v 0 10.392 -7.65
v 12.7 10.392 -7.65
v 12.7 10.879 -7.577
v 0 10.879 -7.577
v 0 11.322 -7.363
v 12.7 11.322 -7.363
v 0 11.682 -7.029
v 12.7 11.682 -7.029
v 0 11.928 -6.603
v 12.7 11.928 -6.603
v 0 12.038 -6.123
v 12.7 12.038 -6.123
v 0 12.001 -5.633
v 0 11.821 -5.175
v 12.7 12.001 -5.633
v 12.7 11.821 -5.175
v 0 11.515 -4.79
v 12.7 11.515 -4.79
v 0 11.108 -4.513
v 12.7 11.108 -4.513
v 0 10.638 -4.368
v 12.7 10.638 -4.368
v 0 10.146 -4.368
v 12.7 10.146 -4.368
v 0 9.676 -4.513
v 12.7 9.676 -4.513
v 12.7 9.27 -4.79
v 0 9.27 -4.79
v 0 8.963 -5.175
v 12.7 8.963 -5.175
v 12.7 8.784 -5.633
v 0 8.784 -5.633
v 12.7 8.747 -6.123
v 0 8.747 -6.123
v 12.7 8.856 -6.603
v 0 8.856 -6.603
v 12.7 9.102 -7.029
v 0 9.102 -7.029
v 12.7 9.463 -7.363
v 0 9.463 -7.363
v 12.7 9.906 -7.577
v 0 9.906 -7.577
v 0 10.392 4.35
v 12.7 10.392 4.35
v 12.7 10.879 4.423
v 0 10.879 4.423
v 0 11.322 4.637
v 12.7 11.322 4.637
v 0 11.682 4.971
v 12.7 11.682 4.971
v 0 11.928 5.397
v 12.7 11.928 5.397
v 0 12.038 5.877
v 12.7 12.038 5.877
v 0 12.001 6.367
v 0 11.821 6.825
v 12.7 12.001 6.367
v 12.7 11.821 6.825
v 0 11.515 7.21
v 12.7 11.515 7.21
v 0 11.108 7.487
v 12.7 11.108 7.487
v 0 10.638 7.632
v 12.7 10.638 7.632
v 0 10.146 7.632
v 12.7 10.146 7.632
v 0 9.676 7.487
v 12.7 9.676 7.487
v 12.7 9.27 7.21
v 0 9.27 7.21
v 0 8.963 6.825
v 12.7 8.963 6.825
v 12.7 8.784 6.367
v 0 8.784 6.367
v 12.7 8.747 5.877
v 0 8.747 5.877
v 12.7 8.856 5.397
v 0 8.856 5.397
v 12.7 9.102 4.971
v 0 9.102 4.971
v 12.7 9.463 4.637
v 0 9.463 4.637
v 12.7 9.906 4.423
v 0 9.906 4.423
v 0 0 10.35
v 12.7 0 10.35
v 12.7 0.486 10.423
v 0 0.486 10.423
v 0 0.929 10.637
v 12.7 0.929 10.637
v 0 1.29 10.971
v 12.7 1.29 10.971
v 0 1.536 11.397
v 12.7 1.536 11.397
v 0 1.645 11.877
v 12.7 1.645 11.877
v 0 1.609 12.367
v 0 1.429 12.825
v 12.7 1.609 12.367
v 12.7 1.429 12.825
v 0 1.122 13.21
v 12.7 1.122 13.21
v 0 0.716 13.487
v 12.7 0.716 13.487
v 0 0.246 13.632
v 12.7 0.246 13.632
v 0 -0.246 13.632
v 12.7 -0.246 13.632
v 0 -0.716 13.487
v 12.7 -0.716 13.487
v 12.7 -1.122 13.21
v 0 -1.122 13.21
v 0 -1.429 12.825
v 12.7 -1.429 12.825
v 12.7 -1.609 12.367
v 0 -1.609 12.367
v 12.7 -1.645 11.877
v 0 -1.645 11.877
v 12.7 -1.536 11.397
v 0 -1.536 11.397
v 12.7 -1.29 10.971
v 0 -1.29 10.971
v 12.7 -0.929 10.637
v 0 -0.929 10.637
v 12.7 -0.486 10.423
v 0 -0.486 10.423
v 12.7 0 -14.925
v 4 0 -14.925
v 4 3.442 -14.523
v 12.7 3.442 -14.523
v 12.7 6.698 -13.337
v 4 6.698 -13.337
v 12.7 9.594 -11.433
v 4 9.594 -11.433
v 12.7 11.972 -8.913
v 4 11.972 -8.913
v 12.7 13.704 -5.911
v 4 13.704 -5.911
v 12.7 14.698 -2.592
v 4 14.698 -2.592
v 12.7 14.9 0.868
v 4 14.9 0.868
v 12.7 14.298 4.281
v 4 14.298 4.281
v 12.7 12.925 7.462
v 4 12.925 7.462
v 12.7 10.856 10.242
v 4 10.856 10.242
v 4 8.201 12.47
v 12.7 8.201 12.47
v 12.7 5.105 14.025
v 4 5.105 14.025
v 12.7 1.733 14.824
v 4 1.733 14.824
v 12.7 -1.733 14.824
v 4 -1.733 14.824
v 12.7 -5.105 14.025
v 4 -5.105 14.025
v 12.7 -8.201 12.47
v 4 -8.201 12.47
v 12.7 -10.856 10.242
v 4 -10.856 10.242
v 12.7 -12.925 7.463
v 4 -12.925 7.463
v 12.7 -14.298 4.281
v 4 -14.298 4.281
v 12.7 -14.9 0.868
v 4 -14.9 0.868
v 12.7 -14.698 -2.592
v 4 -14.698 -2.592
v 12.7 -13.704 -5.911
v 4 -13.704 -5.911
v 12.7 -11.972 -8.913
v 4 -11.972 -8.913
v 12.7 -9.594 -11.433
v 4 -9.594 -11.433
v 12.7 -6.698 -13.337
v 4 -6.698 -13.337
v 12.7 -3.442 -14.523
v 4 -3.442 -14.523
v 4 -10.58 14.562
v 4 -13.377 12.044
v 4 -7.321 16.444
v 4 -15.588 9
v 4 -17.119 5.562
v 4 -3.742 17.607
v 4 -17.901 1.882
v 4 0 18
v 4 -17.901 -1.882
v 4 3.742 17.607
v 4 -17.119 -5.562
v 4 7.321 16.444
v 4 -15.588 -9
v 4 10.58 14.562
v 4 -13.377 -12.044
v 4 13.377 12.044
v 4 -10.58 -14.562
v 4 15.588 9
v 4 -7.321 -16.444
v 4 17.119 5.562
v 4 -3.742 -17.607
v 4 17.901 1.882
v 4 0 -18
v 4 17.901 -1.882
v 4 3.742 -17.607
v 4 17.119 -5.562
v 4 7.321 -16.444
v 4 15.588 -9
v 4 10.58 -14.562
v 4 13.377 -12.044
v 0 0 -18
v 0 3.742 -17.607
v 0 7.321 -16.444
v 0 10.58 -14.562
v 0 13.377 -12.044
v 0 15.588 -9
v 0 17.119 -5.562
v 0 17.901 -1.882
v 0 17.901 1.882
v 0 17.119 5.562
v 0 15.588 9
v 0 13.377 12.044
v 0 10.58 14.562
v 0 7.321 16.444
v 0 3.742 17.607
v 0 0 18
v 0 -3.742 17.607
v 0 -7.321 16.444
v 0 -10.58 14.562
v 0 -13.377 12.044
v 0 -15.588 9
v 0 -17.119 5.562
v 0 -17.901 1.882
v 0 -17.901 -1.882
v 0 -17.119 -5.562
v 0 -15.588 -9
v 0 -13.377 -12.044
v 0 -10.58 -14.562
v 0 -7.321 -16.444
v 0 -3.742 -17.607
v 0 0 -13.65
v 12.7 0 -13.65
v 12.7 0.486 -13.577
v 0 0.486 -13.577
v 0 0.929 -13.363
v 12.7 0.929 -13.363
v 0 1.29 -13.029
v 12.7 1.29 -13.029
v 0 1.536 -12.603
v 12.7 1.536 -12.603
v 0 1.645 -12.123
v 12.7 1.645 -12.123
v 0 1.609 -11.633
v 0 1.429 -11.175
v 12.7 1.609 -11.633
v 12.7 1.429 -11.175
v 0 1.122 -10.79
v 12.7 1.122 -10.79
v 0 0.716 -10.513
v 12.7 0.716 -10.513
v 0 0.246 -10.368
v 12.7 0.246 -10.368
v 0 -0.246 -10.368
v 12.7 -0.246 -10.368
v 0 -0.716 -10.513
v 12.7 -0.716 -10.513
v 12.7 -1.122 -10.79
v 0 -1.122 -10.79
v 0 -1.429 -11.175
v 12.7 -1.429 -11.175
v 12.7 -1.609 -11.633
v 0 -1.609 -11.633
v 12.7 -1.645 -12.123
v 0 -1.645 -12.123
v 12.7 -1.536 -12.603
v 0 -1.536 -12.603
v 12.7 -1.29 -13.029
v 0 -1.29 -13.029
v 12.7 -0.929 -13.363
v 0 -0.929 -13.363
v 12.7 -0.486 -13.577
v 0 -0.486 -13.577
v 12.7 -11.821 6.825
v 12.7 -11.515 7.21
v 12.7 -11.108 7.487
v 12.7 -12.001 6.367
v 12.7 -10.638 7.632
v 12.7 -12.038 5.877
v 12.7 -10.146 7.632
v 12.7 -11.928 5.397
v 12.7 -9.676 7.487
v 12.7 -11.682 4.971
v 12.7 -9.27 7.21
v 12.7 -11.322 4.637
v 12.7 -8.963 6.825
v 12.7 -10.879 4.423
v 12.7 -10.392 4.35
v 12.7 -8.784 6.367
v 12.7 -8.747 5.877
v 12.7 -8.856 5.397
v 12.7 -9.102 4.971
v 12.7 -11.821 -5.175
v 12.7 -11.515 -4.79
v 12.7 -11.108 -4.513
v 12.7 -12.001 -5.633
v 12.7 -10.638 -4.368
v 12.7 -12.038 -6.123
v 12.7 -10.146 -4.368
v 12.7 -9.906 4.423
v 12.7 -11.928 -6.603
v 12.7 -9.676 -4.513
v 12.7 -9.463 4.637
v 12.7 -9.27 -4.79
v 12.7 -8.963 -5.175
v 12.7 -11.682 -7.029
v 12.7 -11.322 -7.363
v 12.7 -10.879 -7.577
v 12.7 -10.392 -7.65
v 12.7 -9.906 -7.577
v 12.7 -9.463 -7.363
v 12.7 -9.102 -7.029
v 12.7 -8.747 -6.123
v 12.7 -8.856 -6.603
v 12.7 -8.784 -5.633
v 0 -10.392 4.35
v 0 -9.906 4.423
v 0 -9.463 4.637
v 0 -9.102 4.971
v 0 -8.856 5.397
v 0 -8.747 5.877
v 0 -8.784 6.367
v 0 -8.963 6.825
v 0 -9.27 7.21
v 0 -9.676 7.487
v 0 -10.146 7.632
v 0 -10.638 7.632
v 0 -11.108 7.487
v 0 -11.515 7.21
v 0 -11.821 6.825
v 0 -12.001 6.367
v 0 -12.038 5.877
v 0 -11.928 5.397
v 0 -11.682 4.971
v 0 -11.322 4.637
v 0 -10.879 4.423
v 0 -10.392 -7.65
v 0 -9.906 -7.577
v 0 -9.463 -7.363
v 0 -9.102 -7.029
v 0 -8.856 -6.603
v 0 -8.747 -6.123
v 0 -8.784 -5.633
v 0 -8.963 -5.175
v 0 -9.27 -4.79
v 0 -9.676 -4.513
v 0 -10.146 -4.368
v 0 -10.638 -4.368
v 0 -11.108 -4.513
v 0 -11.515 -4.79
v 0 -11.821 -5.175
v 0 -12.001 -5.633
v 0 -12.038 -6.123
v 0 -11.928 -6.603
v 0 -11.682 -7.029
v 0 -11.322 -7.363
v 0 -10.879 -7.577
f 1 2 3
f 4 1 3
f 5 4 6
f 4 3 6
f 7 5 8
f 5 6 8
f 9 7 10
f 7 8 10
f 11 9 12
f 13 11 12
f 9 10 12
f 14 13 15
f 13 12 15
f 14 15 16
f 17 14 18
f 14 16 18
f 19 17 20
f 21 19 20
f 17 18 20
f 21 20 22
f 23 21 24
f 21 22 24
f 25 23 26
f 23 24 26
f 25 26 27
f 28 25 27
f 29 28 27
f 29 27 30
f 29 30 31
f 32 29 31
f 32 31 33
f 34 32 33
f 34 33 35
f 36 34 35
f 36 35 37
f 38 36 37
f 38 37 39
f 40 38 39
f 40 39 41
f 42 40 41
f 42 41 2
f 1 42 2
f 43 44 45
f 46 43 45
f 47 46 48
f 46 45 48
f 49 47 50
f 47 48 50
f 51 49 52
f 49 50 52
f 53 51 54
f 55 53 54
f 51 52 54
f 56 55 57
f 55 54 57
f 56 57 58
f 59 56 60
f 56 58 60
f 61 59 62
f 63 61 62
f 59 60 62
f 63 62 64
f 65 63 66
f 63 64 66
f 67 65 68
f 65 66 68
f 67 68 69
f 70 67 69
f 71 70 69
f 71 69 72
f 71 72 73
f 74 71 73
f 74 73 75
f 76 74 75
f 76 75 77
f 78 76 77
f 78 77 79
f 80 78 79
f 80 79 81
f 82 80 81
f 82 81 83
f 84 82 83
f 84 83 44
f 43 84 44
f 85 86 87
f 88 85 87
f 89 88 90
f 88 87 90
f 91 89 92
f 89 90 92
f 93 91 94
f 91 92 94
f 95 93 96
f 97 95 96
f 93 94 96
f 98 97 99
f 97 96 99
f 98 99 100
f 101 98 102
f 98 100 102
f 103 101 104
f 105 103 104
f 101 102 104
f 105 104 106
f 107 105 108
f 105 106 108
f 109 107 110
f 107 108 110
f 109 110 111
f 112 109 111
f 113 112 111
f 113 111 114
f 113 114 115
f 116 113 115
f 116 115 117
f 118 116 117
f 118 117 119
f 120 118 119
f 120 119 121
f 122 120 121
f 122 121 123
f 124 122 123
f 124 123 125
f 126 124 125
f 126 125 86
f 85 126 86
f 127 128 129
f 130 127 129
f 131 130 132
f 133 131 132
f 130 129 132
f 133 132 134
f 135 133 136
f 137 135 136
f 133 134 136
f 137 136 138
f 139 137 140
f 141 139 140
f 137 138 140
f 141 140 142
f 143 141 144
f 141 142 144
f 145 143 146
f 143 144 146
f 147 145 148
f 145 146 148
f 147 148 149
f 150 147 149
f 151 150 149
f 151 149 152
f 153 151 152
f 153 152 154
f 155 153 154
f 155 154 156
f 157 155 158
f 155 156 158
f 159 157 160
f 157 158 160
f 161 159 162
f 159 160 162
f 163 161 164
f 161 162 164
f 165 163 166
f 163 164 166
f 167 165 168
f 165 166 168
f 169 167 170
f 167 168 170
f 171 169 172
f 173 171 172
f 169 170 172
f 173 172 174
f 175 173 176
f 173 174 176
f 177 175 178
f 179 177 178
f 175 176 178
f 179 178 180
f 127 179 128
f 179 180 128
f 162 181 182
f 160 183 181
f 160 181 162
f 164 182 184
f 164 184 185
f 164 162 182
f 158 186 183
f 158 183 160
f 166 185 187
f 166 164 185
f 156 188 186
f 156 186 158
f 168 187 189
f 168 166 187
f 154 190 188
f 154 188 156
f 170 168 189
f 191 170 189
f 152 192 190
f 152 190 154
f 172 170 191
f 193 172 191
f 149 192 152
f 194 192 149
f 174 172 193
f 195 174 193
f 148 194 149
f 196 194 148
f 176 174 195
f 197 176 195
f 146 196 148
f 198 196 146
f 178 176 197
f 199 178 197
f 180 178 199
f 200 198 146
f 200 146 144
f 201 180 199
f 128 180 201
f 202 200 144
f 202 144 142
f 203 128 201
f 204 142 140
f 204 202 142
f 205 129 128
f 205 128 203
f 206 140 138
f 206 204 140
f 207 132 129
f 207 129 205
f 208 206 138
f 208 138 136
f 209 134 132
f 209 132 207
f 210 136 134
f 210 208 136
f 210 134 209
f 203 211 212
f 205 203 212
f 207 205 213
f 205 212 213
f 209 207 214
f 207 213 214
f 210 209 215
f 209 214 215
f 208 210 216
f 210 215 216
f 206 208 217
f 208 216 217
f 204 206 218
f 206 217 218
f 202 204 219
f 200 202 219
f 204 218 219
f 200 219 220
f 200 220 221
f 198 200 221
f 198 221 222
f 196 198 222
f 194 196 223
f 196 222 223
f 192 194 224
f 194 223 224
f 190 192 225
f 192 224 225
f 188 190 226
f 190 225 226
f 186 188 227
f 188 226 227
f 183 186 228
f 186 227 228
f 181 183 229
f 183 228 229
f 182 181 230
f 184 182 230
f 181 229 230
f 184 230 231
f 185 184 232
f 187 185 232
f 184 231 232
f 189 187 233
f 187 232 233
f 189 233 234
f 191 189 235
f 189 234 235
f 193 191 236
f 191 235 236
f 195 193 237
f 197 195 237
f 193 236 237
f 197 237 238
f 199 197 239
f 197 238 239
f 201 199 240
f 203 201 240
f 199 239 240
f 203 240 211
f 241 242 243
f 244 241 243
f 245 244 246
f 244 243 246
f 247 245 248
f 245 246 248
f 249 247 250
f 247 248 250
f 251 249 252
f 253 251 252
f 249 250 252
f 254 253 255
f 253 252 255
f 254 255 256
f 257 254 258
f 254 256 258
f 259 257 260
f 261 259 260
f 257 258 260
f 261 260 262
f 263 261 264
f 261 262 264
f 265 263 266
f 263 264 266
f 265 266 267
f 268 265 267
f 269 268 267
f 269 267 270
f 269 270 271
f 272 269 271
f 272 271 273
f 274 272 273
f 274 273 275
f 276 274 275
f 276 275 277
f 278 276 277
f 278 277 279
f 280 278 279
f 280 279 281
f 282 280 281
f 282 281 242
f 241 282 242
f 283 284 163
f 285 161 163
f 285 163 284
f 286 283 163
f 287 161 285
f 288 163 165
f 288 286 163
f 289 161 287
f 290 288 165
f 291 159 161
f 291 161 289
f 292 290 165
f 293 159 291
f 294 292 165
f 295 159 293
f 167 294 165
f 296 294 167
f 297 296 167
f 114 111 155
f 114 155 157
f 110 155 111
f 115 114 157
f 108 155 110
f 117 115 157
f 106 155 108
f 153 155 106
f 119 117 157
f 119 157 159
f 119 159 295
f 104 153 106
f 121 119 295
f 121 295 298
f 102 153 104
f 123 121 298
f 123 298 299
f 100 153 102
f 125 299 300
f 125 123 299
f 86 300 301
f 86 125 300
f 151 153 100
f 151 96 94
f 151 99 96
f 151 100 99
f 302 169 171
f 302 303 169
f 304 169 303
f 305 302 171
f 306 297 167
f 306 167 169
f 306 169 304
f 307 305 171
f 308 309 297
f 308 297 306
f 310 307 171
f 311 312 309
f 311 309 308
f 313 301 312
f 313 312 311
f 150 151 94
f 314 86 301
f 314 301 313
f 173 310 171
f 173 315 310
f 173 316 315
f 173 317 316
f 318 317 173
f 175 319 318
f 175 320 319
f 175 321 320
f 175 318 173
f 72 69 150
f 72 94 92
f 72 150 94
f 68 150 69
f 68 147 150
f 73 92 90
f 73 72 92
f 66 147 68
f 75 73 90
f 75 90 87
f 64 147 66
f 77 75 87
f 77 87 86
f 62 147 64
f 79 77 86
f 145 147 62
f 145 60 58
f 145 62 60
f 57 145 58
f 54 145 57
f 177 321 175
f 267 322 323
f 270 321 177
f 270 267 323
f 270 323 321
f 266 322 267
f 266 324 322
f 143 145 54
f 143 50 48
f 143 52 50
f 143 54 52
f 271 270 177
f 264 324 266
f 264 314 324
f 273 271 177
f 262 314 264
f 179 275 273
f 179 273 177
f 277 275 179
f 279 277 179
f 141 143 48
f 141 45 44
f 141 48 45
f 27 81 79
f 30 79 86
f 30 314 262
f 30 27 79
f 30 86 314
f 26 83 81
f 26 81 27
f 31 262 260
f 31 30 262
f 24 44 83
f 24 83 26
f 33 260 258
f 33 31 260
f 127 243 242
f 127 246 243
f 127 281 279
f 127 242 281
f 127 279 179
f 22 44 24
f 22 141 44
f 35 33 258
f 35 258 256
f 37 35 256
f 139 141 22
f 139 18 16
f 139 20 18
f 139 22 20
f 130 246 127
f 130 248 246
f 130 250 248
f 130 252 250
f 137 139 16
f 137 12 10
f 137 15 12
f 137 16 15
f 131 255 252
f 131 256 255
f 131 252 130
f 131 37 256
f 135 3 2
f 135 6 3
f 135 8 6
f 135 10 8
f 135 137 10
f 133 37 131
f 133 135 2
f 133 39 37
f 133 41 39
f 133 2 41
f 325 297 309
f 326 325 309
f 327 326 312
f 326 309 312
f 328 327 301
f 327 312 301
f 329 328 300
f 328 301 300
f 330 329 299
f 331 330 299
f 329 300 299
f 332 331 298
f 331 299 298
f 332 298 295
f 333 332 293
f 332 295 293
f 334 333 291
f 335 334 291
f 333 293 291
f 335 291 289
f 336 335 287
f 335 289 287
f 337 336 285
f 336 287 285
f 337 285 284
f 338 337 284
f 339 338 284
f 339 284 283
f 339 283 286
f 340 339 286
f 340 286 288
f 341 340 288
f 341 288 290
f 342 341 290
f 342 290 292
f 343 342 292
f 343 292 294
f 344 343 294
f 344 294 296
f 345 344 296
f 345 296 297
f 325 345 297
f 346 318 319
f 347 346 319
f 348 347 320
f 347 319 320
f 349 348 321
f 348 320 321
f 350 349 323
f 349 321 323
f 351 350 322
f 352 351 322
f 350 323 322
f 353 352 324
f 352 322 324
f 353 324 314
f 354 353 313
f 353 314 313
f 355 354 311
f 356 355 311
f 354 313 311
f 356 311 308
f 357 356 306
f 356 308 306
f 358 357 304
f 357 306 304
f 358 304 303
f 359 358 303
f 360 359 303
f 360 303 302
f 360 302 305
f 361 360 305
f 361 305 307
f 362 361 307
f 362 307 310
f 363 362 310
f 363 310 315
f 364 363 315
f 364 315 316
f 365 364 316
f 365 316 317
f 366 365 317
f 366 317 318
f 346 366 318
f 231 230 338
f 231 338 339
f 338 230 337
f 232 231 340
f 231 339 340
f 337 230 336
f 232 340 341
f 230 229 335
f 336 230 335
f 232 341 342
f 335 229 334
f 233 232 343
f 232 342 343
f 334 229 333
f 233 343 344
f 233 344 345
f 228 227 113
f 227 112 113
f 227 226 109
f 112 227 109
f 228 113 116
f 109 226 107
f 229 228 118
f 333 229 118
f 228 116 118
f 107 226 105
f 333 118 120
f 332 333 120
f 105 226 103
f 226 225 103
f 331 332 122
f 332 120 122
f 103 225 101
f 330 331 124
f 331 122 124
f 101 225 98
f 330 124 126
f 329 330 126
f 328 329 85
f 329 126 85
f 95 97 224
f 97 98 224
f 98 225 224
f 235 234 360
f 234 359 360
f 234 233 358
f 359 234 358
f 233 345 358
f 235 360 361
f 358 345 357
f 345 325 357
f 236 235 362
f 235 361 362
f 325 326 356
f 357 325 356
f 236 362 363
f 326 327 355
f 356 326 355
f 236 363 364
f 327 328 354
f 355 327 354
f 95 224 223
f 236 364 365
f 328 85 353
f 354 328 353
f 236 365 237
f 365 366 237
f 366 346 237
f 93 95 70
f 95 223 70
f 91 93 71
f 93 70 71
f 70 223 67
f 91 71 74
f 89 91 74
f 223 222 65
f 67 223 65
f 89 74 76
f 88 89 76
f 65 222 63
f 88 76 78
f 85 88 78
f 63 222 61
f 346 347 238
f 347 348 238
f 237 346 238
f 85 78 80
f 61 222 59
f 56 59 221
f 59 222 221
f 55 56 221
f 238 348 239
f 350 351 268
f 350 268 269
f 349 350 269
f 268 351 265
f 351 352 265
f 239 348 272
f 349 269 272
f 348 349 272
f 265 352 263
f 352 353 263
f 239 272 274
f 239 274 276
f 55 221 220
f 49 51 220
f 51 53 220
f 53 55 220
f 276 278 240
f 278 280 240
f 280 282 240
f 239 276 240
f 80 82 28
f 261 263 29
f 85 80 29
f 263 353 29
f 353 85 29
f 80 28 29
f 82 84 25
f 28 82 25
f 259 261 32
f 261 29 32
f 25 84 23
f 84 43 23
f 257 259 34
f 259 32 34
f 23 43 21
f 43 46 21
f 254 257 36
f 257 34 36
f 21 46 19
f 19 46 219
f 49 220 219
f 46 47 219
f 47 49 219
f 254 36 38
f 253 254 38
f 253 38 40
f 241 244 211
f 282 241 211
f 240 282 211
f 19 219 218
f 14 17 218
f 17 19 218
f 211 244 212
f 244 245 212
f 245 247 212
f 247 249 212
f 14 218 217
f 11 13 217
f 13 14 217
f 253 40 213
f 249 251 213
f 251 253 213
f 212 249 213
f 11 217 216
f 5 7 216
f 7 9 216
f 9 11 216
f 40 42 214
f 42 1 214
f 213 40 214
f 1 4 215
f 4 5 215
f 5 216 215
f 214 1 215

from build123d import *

# Parameters (mm, degrees)
SKETCH1_R           = 18
BOSS_EXTRUDE1_DEPTH = 4
SKETCH2_R           = 14.925
BOSS_EXTRUDE2_DEPTH = 8.7
SKETCH3_R           = 1.65
CUT_EXTRUDE1_DEPTH  = 29.448022778


with BuildPart() as part:
    # Sketch1 → Boss-Extrude1 (new body)
    with BuildSketch(Plane.YZ):
        with Locations(Location((0, 0, 0), (0, 0, 270))):
            Circle(SKETCH1_R)
    extrude(amount=BOSS_EXTRUDE1_DEPTH)

    # Sketch2 → Boss-Extrude2 (add)
    with BuildSketch(Plane.YZ.offset(4)):
        with Locations(Location((0, 0, 0), (0, 0, 270))):
            Circle(SKETCH2_R)
    extrude(amount=BOSS_EXTRUDE2_DEPTH)

    # Sketch3 → Cut-Extrude1 (cut, through all)
    with BuildSketch(Plane.YZ.offset(12.7)):
        with Locations(Location((0, 12, 0), (0, 0, 270))):
            Circle(SKETCH3_R)
        with Locations(Location((10.392304845, 6, 0), (0, 0, 270))):
            Circle(SKETCH3_R)
        with Locations(Location((10.392304845, -6, 0), (0, 0, 270))):
            Circle(SKETCH3_R)
        with Locations(Location((0, -12, 0), (0, 0, 270))):
            Circle(SKETCH3_R)
        with Locations(Location((-10.392304845, -6, 0), (0, 0, 270))):
            Circle(SKETCH3_R)
        with Locations(Location((-10.392304845, 6, 0), (0, 0, 270))):
            Circle(SKETCH3_R)
    extrude(amount=-CUT_EXTRUDE1_DEPTH, mode=Mode.SUBTRACT)


solid = part.part
